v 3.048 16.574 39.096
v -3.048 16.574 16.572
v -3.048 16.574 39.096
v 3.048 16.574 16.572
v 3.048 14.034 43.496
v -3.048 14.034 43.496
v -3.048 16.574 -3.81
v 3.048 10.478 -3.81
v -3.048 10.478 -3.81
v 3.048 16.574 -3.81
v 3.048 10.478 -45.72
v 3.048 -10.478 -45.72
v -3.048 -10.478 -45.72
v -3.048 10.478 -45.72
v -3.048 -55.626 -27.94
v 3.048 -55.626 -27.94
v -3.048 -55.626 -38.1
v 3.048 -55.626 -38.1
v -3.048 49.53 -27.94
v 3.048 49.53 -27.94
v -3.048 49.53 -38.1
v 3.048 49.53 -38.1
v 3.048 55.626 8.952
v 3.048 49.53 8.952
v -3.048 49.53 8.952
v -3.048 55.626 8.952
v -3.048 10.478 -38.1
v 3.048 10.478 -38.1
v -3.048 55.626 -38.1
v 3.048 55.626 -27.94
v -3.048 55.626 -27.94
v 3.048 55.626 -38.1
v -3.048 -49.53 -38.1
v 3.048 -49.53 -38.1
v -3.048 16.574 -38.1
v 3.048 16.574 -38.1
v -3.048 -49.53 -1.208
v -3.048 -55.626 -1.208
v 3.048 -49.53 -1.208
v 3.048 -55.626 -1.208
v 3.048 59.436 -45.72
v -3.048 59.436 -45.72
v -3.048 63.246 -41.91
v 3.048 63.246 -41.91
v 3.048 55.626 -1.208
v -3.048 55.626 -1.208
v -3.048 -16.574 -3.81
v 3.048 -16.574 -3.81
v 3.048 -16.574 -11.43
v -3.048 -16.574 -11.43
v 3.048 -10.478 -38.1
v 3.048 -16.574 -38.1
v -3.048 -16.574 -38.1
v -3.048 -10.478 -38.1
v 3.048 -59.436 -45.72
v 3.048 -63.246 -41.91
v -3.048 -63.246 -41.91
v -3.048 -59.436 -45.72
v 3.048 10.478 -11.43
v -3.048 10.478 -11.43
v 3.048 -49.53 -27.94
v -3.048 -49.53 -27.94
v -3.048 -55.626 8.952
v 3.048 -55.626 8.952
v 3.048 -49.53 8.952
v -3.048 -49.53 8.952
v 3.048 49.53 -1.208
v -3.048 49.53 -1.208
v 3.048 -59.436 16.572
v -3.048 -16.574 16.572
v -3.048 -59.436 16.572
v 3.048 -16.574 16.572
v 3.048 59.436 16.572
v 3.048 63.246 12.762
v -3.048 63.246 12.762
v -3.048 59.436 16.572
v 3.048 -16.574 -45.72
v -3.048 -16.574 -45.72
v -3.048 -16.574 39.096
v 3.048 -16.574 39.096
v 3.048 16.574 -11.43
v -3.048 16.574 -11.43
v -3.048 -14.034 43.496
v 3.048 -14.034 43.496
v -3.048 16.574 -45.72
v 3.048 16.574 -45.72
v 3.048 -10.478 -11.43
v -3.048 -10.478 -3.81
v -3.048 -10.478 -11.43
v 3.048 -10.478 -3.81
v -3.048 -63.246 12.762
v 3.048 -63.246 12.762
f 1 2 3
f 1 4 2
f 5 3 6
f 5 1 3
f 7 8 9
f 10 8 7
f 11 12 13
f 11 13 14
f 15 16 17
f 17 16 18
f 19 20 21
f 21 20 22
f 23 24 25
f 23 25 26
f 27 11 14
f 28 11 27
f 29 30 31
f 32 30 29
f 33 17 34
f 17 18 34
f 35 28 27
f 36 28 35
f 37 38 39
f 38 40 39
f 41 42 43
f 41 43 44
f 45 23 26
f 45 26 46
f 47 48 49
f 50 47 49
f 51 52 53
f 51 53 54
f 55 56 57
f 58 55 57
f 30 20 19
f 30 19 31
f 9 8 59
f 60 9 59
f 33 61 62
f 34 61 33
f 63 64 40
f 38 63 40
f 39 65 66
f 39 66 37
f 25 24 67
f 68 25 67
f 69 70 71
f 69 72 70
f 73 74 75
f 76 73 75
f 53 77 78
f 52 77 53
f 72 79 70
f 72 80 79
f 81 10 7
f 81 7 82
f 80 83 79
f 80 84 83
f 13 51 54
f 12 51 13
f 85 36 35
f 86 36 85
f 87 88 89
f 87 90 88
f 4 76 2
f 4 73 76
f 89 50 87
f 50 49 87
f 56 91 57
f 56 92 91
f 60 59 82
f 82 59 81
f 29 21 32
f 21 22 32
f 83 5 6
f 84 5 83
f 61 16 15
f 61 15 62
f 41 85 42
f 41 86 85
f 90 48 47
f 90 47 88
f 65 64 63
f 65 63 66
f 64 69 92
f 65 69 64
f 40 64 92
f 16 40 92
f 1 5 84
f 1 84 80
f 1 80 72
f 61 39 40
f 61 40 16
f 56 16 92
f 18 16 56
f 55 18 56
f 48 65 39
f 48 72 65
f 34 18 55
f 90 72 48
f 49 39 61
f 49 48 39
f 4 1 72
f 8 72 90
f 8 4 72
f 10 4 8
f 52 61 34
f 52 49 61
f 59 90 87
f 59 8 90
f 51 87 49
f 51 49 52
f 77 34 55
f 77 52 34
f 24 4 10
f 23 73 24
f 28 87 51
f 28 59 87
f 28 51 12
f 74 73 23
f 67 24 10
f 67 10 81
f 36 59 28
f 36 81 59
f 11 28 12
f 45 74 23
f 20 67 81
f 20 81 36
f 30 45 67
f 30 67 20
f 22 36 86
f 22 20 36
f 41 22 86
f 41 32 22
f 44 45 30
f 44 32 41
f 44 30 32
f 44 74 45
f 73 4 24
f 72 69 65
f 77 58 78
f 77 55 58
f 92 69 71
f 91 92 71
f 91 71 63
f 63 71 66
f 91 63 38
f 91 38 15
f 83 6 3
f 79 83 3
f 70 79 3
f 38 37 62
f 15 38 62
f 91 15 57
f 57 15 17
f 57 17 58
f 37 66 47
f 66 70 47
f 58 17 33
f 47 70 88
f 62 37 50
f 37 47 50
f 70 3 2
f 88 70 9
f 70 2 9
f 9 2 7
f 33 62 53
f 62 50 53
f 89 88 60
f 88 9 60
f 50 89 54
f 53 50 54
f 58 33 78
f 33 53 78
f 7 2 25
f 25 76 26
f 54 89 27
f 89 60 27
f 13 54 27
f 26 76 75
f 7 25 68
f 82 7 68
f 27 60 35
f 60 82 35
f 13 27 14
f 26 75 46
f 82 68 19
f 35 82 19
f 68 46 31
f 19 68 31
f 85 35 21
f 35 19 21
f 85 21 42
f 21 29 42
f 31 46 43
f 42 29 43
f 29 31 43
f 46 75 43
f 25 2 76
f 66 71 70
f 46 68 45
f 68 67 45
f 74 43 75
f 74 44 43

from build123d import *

# Parameters (mm, degrees)
SKETCH1_W           = 10.16
SKETCH1_H           = 6.096
SKETCH1_W_2         = 7.62
BOSS_EXTRUDE1_DEPTH = 3.048
CHAMFER2_SIZE       = 3.81


with BuildPart() as part:
    # Sketch1 → Boss-Extrude1 (new body, symmetric)
    with BuildSketch(Plane(origin=(0, 0, 0), x_dir=(0, 0, -1), z_dir=(1, 0, 0))):
        Polygon((45.72, -63.246), (45.72, -16.5735), (38.1, -16.5735), (38.1, -10.4775), (45.72, -10.4775), (45.72, 10.4775), (38.1, 10.4775), (38.1, 16.5735), (45.72, 16.5735), (45.72, 63.246), (-16.571856626, 63.246), (-16.571856626, 16.5735), (-39.096447575, 16.5735), (-43.495856626, 14.0335), (-43.495856626, -14.0335), (-39.096447575, -16.5735), (-16.571856626, -16.5735), (-16.571856626, -63.246), align=None)
        with Locations((33.02, -52.578)):
            Rectangle(SKETCH1_W, SKETCH1_H, mode=Mode.SUBTRACT)
        with Locations((33.02, 52.578)):
            Rectangle(SKETCH1_W, SKETCH1_H, mode=Mode.SUBTRACT)
        with Locations((-3.871856626, 52.578)):
            Rectangle(SKETCH1_W, SKETCH1_H, mode=Mode.SUBTRACT)
        with Locations((-3.871856626, -52.578)):
            Rectangle(SKETCH1_W, SKETCH1_H, mode=Mode.SUBTRACT)
        with Locations((7.62, 13.5255)):
            Rectangle(SKETCH1_W_2, SKETCH1_H, mode=Mode.SUBTRACT)
        with Locations((7.62, -13.5255)):
            Rectangle(SKETCH1_W_2, SKETCH1_H, mode=Mode.SUBTRACT)
    extrude(amount=BOSS_EXTRUDE1_DEPTH, both=True)

    # Chamfer2
    chamfer2_edges = [part.edges().sort_by_distance(p)[0] for p in [
        (0, -63.246, -45.72),
        (0, -63.246, 16.571856626),
        (0, 63.246, 16.571856626),
        (0, 63.246, -45.72),
    ]]
    chamfer(chamfer2_edges, length=CHAMFER2_SIZE)


solid = part.part
